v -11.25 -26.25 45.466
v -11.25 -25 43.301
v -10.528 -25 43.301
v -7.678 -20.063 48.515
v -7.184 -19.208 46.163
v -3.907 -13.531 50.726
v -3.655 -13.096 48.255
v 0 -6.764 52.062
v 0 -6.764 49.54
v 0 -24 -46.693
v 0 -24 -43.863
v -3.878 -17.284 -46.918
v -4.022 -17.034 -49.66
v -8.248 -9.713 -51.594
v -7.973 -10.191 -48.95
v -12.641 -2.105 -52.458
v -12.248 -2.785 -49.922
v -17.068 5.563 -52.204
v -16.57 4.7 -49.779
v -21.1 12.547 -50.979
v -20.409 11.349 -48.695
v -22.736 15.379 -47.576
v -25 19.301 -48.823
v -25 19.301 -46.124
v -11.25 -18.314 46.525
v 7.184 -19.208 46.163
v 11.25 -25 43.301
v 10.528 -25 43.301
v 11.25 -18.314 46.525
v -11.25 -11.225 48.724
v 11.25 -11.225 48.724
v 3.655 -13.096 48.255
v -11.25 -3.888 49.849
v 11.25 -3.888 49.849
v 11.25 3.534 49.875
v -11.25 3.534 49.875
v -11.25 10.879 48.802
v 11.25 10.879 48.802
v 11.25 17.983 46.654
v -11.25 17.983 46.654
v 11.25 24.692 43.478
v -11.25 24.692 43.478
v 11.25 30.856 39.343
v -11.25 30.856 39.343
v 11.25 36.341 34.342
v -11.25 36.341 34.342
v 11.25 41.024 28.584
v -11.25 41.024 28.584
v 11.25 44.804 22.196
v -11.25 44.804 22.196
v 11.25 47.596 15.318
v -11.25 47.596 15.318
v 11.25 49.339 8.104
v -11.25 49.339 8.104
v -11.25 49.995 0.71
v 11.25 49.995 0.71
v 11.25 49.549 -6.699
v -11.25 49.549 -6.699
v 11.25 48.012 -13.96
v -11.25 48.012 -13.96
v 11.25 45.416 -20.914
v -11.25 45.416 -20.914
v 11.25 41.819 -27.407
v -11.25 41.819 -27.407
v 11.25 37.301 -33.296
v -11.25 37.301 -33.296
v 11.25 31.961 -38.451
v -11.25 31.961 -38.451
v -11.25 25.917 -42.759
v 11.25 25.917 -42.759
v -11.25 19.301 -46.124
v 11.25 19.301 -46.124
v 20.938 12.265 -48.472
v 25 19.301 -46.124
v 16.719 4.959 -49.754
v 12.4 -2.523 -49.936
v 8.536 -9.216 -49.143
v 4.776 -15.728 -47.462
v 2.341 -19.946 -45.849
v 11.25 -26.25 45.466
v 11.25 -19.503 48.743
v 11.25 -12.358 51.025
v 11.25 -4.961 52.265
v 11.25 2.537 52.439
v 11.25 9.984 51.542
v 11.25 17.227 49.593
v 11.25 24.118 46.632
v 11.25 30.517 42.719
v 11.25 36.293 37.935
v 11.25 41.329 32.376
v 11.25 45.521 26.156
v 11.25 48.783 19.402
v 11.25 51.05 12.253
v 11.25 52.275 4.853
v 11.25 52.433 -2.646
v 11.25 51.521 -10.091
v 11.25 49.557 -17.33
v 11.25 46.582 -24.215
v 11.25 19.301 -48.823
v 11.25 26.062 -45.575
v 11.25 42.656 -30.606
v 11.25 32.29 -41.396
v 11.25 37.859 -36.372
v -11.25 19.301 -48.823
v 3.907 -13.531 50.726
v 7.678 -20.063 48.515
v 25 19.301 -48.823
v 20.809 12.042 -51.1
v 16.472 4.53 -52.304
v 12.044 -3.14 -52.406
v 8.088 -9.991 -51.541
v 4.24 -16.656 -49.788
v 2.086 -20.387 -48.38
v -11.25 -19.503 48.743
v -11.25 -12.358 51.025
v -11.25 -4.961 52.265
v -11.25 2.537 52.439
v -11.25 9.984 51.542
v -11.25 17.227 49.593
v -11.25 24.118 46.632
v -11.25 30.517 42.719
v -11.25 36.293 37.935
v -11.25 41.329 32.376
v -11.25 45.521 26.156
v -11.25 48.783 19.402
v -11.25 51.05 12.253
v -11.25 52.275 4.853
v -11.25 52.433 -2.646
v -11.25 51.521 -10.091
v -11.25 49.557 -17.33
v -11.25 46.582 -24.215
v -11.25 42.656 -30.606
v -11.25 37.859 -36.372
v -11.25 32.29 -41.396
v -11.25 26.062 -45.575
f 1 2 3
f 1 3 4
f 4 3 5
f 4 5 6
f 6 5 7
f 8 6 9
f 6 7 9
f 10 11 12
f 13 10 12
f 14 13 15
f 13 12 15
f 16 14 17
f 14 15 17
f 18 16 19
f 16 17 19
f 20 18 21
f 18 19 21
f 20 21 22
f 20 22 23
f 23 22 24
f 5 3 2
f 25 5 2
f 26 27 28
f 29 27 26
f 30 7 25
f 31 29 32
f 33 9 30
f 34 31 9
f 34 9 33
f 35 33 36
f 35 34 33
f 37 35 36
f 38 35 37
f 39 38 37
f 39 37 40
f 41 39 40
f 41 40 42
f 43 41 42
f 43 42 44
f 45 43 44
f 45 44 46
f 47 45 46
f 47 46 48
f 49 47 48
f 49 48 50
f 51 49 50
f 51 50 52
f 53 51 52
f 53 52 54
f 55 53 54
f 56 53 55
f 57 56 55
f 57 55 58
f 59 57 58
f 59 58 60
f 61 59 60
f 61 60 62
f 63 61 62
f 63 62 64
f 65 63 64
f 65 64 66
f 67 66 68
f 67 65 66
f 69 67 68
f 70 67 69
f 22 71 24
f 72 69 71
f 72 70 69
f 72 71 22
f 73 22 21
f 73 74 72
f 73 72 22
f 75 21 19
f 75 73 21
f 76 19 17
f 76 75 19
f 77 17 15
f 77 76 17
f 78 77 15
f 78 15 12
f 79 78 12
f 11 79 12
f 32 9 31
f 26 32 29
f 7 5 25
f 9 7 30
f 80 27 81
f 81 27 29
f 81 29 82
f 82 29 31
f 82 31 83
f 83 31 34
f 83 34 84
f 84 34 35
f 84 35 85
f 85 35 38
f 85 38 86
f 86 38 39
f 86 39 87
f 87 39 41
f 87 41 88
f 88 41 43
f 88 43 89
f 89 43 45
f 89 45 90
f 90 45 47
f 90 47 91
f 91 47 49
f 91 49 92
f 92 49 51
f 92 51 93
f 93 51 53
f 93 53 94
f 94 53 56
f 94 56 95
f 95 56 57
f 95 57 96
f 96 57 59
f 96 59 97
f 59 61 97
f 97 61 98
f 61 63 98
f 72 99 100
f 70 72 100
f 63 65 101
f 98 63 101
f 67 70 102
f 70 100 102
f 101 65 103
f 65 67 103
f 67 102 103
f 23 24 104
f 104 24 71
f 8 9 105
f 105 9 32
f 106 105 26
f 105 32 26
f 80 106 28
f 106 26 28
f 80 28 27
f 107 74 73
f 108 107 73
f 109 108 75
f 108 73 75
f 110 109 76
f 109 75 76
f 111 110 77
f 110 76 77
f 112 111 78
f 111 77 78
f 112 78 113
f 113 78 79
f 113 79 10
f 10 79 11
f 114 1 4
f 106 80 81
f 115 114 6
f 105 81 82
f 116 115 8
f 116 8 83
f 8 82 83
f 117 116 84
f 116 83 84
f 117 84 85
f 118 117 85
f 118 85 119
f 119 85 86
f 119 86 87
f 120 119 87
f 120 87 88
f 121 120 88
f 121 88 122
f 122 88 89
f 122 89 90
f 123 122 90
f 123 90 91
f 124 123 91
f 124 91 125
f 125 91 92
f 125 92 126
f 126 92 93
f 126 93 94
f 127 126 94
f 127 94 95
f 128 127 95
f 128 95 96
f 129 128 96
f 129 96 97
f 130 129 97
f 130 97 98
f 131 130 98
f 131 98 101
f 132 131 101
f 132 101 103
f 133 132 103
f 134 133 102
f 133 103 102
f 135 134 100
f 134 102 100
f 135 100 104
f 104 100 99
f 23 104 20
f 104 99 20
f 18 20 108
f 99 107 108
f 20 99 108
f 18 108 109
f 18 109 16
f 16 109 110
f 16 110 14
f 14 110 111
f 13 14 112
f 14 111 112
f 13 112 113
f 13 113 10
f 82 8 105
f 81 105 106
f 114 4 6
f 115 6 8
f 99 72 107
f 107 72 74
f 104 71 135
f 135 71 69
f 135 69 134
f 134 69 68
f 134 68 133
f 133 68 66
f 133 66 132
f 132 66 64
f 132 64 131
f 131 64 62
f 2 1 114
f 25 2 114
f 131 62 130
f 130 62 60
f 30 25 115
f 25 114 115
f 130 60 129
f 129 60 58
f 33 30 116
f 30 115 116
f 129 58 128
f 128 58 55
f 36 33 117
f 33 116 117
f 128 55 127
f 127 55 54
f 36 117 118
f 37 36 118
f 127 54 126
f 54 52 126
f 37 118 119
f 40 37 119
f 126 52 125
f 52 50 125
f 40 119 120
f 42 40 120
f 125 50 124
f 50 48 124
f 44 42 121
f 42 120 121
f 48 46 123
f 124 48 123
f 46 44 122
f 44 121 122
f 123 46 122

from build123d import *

# Parameters (mm, degrees)
CIRCULARBAND_W               = 50
CIRCULARBAND_H               = 2.5
BASE_REVOLVE_ANGLE           = 120
BASE_REVOLVE_OTHER_WAY_ANGLE = 120
SKETCH9_OUTSIDE_W            = 80.09
SKETCH9_OUTSIDE_H            = 108.84
HEAD1_DEPTH                  = 53.5
SKETCH10_OUTSIDE_W           = 80.09
SKETCH10_OUTSIDE_H           = 108.84
TAIL1_DEPTH                  = 53.5


with BuildPart() as part:
    # circularband → Base-Revolve (revolve)
    with BuildSketch(Plane.XY):
        with Locations((0, 51.25)):
            Rectangle(CIRCULARBAND_W, CIRCULARBAND_H)
    revolve(axis=Axis((0, 0, 0), (1, 0, 0)), revolution_arc=BASE_REVOLVE_ANGLE)

    # circularband → Base-Revolve other way (revolve)
    with BuildSketch(Plane.XY):
        with Locations((0, 51.25)):
            Rectangle(CIRCULARBAND_W, CIRCULARBAND_H)
    revolve(axis=Axis((0, 0, 0), (-1, 0, 0)), revolution_arc=BASE_REVOLVE_OTHER_WAY_ANGLE)

    # Sketch9 outside → head1 (cut, through all)
    with BuildSketch(Plane.XY):
        with Locations((0, 13.125)):
            Rectangle(SKETCH9_OUTSIDE_W, SKETCH9_OUTSIDE_H)
        Polygon((-11.25, 52.5), (11.25, 52.5), (11.25, 19.301270189), (25, 19.301270189), (0, -24), (-25, 19.301270189), (-11.25, 19.301270189), align=None, mode=Mode.SUBTRACT)
    extrude(amount=-HEAD1_DEPTH, mode=Mode.SUBTRACT)

    # Sketch10 outside → tail1 (cut, through all)
    with BuildSketch(Plane.XY):
        with Locations((0, 13.125)):
            Rectangle(SKETCH10_OUTSIDE_W, SKETCH10_OUTSIDE_H)
        Polygon((0, -6.764428415), (11.25, -26.25), (11.25, 52.5), (-11.25, 52.5), (-11.25, -26.25), align=None, mode=Mode.SUBTRACT)
    extrude(amount=TAIL1_DEPTH, mode=Mode.SUBTRACT)


solid = part.part
